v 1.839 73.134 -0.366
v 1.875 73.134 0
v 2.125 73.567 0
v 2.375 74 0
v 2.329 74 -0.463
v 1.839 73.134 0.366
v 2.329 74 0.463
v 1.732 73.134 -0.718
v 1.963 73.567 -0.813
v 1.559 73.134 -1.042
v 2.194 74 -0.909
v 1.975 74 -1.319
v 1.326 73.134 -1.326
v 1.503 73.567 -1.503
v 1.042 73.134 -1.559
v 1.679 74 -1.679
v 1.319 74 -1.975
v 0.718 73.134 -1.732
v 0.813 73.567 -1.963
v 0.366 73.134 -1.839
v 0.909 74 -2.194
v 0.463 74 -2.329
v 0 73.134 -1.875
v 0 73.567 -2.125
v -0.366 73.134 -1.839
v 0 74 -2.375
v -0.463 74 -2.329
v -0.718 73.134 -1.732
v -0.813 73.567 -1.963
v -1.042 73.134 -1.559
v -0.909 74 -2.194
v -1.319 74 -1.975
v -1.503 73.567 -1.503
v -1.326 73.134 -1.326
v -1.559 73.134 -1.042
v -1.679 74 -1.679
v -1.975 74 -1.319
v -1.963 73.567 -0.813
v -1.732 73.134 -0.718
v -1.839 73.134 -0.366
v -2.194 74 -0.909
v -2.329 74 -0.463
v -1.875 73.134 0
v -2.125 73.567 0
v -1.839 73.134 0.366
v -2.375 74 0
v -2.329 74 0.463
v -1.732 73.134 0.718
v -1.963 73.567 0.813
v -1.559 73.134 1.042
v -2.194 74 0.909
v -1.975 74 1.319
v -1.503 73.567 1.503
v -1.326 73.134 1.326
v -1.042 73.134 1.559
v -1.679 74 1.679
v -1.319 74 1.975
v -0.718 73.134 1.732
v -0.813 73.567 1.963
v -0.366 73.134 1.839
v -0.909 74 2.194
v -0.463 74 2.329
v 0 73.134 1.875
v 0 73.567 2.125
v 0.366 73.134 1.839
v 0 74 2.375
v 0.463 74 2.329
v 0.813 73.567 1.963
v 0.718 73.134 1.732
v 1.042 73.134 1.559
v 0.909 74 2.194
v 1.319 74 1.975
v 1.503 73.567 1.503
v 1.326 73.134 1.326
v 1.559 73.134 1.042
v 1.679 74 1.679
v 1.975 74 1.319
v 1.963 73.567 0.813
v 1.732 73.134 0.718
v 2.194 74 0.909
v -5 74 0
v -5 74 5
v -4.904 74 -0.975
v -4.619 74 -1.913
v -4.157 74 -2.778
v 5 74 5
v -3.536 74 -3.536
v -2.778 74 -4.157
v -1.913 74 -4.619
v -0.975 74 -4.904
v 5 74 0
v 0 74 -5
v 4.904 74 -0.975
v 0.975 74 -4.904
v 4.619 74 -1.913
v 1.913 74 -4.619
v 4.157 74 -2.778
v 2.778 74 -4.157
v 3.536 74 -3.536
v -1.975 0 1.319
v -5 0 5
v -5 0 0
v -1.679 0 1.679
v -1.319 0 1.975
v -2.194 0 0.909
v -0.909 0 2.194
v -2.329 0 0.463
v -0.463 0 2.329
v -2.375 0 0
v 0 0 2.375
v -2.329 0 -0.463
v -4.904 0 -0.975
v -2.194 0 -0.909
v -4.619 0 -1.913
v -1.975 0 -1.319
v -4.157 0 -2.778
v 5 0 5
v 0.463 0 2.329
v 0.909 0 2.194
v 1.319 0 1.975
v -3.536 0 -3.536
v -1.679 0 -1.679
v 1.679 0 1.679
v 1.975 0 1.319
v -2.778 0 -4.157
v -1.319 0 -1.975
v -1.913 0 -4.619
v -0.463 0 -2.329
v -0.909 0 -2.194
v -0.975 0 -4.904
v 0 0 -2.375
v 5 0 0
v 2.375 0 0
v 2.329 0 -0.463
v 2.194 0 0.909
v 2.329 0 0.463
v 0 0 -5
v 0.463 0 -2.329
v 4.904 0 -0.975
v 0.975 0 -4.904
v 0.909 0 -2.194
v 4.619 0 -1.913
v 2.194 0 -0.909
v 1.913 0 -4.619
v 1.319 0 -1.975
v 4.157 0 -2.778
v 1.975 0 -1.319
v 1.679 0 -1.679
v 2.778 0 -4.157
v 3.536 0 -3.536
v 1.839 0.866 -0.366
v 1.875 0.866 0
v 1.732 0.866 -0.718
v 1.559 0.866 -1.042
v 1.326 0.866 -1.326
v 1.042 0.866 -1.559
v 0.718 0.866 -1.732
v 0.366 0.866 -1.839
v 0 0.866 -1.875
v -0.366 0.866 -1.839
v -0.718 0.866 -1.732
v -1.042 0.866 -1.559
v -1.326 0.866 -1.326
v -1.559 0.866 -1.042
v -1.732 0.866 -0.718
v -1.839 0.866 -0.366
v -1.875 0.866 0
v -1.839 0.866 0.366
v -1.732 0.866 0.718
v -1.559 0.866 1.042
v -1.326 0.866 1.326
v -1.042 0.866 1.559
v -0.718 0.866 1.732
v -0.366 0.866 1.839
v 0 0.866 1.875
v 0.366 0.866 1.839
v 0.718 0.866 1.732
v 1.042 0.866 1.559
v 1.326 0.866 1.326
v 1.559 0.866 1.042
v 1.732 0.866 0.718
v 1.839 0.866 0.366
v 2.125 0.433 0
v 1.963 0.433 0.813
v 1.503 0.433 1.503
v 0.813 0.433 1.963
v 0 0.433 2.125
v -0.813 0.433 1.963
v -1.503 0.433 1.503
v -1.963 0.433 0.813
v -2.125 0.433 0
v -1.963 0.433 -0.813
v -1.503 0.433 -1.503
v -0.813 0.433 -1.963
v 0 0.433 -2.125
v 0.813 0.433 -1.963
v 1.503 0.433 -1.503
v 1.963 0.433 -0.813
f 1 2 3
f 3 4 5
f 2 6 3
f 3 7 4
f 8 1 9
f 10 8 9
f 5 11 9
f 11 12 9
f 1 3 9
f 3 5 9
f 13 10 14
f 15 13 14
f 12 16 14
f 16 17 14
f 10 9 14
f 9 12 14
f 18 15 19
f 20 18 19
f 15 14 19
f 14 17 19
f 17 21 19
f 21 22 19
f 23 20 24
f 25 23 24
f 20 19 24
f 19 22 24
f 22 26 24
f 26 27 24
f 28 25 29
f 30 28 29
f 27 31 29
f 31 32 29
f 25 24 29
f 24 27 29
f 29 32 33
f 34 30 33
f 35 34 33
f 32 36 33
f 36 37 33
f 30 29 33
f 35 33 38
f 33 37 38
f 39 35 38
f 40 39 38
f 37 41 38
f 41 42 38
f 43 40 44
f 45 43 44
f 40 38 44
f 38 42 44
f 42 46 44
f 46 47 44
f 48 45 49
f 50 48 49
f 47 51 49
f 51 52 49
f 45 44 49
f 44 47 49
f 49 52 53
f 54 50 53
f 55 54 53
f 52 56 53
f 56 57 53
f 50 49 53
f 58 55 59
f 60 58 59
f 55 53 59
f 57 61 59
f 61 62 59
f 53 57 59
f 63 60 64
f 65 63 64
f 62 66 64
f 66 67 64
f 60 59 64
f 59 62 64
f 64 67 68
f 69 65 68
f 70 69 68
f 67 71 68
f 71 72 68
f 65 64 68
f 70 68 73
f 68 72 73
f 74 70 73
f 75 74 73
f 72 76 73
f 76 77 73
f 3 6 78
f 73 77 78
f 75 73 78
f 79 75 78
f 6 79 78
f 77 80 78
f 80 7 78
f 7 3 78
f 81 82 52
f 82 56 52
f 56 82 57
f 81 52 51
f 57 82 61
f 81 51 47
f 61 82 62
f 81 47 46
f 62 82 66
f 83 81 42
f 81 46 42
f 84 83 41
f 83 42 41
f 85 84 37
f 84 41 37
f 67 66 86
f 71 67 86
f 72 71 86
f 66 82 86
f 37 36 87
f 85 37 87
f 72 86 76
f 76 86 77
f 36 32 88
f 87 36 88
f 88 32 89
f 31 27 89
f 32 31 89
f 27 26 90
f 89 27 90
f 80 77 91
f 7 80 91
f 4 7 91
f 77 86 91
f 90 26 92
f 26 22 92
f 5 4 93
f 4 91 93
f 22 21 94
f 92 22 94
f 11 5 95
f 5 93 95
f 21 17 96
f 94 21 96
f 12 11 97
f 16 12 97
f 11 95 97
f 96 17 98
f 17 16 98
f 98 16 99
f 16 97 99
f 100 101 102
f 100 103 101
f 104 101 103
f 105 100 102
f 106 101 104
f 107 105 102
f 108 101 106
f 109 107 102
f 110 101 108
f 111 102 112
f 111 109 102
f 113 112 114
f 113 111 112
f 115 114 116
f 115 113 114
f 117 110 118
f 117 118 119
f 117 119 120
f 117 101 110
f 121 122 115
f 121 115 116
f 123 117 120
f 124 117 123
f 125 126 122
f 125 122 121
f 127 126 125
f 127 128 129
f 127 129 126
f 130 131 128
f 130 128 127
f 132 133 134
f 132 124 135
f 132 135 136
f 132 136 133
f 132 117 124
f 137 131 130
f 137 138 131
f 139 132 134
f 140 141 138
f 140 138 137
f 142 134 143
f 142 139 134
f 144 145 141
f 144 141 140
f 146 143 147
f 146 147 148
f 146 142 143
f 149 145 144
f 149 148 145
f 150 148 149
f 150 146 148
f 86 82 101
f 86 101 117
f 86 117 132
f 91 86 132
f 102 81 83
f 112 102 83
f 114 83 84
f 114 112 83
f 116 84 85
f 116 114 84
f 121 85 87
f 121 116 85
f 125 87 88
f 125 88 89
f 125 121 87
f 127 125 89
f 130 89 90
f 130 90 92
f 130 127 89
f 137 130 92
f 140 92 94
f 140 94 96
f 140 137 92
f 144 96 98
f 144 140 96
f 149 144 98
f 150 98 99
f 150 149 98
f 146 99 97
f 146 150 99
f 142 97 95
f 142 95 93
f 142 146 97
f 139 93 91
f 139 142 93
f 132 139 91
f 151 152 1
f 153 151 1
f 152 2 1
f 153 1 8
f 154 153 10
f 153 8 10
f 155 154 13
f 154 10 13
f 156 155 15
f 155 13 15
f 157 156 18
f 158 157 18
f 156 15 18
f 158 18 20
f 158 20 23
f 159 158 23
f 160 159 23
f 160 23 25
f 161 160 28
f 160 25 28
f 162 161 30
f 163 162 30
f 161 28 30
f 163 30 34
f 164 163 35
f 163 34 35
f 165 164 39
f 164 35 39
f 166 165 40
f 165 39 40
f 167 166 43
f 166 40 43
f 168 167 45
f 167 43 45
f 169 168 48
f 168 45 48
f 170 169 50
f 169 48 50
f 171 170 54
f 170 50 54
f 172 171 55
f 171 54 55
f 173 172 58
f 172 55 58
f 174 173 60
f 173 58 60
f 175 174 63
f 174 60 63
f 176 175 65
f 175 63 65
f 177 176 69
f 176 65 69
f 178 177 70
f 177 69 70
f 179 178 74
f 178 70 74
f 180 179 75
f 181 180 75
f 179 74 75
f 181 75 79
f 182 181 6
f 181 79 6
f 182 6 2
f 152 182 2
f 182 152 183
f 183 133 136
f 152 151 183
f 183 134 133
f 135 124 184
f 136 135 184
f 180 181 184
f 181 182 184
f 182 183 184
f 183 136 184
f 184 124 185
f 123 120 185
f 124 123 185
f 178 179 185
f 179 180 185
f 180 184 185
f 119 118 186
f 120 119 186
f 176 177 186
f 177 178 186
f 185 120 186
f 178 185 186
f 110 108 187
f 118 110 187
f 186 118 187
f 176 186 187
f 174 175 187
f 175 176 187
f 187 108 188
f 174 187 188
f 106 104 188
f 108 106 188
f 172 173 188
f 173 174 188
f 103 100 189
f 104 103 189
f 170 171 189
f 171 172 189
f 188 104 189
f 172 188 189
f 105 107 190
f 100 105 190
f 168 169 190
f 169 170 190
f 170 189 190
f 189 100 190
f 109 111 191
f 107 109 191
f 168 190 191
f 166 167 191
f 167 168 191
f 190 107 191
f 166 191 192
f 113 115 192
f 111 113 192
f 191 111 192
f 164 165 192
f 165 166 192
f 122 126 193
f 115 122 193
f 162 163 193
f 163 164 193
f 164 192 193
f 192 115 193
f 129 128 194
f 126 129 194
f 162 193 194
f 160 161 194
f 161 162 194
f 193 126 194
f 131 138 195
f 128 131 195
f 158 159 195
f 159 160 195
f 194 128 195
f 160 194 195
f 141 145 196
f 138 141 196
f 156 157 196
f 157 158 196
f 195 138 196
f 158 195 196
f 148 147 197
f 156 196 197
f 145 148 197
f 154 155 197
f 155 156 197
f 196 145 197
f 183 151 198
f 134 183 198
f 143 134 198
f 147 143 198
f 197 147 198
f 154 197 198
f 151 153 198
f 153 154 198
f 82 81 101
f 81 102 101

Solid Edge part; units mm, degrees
sketch "Sketch1" plane through (0, 0, 0) normal (0, -1, 0) x (1, 0, 0)
  arc A0 (-5, 0) -> (5, 0) centre (0, 0) ccw
  line L0 (5, 5) -> (5, 0)
  line L1 (-5, 5) -> (5, 5)
  line L2 (-5, 0) -> (-5, 5)
  dimension "D1" = 5
  dimension "D2" = 5
extrude "Extrusionsausprägung_2" add sketch "Sketch1" against normal blind 74
sketch "Sketch2" plane through (0, 74, 0) normal (0, 1, 0) x (1, 0, 0)
  circle A0 centre (0, 0) radius 1.875
  dimension "D1" = 3.75
extrude "Cutout1" cut sketch "Sketch2" against normal up to next
chamfer "Fase_1" distance 0.5 angle 60 2 edges at (-1.875, 74, 0) (0, 0, 1.875) measured on face at (-3.2333, 0, 3.4333) measured on face at (-3.2333, 74, 3.4333)
properties material "Nylon, allgemein"
